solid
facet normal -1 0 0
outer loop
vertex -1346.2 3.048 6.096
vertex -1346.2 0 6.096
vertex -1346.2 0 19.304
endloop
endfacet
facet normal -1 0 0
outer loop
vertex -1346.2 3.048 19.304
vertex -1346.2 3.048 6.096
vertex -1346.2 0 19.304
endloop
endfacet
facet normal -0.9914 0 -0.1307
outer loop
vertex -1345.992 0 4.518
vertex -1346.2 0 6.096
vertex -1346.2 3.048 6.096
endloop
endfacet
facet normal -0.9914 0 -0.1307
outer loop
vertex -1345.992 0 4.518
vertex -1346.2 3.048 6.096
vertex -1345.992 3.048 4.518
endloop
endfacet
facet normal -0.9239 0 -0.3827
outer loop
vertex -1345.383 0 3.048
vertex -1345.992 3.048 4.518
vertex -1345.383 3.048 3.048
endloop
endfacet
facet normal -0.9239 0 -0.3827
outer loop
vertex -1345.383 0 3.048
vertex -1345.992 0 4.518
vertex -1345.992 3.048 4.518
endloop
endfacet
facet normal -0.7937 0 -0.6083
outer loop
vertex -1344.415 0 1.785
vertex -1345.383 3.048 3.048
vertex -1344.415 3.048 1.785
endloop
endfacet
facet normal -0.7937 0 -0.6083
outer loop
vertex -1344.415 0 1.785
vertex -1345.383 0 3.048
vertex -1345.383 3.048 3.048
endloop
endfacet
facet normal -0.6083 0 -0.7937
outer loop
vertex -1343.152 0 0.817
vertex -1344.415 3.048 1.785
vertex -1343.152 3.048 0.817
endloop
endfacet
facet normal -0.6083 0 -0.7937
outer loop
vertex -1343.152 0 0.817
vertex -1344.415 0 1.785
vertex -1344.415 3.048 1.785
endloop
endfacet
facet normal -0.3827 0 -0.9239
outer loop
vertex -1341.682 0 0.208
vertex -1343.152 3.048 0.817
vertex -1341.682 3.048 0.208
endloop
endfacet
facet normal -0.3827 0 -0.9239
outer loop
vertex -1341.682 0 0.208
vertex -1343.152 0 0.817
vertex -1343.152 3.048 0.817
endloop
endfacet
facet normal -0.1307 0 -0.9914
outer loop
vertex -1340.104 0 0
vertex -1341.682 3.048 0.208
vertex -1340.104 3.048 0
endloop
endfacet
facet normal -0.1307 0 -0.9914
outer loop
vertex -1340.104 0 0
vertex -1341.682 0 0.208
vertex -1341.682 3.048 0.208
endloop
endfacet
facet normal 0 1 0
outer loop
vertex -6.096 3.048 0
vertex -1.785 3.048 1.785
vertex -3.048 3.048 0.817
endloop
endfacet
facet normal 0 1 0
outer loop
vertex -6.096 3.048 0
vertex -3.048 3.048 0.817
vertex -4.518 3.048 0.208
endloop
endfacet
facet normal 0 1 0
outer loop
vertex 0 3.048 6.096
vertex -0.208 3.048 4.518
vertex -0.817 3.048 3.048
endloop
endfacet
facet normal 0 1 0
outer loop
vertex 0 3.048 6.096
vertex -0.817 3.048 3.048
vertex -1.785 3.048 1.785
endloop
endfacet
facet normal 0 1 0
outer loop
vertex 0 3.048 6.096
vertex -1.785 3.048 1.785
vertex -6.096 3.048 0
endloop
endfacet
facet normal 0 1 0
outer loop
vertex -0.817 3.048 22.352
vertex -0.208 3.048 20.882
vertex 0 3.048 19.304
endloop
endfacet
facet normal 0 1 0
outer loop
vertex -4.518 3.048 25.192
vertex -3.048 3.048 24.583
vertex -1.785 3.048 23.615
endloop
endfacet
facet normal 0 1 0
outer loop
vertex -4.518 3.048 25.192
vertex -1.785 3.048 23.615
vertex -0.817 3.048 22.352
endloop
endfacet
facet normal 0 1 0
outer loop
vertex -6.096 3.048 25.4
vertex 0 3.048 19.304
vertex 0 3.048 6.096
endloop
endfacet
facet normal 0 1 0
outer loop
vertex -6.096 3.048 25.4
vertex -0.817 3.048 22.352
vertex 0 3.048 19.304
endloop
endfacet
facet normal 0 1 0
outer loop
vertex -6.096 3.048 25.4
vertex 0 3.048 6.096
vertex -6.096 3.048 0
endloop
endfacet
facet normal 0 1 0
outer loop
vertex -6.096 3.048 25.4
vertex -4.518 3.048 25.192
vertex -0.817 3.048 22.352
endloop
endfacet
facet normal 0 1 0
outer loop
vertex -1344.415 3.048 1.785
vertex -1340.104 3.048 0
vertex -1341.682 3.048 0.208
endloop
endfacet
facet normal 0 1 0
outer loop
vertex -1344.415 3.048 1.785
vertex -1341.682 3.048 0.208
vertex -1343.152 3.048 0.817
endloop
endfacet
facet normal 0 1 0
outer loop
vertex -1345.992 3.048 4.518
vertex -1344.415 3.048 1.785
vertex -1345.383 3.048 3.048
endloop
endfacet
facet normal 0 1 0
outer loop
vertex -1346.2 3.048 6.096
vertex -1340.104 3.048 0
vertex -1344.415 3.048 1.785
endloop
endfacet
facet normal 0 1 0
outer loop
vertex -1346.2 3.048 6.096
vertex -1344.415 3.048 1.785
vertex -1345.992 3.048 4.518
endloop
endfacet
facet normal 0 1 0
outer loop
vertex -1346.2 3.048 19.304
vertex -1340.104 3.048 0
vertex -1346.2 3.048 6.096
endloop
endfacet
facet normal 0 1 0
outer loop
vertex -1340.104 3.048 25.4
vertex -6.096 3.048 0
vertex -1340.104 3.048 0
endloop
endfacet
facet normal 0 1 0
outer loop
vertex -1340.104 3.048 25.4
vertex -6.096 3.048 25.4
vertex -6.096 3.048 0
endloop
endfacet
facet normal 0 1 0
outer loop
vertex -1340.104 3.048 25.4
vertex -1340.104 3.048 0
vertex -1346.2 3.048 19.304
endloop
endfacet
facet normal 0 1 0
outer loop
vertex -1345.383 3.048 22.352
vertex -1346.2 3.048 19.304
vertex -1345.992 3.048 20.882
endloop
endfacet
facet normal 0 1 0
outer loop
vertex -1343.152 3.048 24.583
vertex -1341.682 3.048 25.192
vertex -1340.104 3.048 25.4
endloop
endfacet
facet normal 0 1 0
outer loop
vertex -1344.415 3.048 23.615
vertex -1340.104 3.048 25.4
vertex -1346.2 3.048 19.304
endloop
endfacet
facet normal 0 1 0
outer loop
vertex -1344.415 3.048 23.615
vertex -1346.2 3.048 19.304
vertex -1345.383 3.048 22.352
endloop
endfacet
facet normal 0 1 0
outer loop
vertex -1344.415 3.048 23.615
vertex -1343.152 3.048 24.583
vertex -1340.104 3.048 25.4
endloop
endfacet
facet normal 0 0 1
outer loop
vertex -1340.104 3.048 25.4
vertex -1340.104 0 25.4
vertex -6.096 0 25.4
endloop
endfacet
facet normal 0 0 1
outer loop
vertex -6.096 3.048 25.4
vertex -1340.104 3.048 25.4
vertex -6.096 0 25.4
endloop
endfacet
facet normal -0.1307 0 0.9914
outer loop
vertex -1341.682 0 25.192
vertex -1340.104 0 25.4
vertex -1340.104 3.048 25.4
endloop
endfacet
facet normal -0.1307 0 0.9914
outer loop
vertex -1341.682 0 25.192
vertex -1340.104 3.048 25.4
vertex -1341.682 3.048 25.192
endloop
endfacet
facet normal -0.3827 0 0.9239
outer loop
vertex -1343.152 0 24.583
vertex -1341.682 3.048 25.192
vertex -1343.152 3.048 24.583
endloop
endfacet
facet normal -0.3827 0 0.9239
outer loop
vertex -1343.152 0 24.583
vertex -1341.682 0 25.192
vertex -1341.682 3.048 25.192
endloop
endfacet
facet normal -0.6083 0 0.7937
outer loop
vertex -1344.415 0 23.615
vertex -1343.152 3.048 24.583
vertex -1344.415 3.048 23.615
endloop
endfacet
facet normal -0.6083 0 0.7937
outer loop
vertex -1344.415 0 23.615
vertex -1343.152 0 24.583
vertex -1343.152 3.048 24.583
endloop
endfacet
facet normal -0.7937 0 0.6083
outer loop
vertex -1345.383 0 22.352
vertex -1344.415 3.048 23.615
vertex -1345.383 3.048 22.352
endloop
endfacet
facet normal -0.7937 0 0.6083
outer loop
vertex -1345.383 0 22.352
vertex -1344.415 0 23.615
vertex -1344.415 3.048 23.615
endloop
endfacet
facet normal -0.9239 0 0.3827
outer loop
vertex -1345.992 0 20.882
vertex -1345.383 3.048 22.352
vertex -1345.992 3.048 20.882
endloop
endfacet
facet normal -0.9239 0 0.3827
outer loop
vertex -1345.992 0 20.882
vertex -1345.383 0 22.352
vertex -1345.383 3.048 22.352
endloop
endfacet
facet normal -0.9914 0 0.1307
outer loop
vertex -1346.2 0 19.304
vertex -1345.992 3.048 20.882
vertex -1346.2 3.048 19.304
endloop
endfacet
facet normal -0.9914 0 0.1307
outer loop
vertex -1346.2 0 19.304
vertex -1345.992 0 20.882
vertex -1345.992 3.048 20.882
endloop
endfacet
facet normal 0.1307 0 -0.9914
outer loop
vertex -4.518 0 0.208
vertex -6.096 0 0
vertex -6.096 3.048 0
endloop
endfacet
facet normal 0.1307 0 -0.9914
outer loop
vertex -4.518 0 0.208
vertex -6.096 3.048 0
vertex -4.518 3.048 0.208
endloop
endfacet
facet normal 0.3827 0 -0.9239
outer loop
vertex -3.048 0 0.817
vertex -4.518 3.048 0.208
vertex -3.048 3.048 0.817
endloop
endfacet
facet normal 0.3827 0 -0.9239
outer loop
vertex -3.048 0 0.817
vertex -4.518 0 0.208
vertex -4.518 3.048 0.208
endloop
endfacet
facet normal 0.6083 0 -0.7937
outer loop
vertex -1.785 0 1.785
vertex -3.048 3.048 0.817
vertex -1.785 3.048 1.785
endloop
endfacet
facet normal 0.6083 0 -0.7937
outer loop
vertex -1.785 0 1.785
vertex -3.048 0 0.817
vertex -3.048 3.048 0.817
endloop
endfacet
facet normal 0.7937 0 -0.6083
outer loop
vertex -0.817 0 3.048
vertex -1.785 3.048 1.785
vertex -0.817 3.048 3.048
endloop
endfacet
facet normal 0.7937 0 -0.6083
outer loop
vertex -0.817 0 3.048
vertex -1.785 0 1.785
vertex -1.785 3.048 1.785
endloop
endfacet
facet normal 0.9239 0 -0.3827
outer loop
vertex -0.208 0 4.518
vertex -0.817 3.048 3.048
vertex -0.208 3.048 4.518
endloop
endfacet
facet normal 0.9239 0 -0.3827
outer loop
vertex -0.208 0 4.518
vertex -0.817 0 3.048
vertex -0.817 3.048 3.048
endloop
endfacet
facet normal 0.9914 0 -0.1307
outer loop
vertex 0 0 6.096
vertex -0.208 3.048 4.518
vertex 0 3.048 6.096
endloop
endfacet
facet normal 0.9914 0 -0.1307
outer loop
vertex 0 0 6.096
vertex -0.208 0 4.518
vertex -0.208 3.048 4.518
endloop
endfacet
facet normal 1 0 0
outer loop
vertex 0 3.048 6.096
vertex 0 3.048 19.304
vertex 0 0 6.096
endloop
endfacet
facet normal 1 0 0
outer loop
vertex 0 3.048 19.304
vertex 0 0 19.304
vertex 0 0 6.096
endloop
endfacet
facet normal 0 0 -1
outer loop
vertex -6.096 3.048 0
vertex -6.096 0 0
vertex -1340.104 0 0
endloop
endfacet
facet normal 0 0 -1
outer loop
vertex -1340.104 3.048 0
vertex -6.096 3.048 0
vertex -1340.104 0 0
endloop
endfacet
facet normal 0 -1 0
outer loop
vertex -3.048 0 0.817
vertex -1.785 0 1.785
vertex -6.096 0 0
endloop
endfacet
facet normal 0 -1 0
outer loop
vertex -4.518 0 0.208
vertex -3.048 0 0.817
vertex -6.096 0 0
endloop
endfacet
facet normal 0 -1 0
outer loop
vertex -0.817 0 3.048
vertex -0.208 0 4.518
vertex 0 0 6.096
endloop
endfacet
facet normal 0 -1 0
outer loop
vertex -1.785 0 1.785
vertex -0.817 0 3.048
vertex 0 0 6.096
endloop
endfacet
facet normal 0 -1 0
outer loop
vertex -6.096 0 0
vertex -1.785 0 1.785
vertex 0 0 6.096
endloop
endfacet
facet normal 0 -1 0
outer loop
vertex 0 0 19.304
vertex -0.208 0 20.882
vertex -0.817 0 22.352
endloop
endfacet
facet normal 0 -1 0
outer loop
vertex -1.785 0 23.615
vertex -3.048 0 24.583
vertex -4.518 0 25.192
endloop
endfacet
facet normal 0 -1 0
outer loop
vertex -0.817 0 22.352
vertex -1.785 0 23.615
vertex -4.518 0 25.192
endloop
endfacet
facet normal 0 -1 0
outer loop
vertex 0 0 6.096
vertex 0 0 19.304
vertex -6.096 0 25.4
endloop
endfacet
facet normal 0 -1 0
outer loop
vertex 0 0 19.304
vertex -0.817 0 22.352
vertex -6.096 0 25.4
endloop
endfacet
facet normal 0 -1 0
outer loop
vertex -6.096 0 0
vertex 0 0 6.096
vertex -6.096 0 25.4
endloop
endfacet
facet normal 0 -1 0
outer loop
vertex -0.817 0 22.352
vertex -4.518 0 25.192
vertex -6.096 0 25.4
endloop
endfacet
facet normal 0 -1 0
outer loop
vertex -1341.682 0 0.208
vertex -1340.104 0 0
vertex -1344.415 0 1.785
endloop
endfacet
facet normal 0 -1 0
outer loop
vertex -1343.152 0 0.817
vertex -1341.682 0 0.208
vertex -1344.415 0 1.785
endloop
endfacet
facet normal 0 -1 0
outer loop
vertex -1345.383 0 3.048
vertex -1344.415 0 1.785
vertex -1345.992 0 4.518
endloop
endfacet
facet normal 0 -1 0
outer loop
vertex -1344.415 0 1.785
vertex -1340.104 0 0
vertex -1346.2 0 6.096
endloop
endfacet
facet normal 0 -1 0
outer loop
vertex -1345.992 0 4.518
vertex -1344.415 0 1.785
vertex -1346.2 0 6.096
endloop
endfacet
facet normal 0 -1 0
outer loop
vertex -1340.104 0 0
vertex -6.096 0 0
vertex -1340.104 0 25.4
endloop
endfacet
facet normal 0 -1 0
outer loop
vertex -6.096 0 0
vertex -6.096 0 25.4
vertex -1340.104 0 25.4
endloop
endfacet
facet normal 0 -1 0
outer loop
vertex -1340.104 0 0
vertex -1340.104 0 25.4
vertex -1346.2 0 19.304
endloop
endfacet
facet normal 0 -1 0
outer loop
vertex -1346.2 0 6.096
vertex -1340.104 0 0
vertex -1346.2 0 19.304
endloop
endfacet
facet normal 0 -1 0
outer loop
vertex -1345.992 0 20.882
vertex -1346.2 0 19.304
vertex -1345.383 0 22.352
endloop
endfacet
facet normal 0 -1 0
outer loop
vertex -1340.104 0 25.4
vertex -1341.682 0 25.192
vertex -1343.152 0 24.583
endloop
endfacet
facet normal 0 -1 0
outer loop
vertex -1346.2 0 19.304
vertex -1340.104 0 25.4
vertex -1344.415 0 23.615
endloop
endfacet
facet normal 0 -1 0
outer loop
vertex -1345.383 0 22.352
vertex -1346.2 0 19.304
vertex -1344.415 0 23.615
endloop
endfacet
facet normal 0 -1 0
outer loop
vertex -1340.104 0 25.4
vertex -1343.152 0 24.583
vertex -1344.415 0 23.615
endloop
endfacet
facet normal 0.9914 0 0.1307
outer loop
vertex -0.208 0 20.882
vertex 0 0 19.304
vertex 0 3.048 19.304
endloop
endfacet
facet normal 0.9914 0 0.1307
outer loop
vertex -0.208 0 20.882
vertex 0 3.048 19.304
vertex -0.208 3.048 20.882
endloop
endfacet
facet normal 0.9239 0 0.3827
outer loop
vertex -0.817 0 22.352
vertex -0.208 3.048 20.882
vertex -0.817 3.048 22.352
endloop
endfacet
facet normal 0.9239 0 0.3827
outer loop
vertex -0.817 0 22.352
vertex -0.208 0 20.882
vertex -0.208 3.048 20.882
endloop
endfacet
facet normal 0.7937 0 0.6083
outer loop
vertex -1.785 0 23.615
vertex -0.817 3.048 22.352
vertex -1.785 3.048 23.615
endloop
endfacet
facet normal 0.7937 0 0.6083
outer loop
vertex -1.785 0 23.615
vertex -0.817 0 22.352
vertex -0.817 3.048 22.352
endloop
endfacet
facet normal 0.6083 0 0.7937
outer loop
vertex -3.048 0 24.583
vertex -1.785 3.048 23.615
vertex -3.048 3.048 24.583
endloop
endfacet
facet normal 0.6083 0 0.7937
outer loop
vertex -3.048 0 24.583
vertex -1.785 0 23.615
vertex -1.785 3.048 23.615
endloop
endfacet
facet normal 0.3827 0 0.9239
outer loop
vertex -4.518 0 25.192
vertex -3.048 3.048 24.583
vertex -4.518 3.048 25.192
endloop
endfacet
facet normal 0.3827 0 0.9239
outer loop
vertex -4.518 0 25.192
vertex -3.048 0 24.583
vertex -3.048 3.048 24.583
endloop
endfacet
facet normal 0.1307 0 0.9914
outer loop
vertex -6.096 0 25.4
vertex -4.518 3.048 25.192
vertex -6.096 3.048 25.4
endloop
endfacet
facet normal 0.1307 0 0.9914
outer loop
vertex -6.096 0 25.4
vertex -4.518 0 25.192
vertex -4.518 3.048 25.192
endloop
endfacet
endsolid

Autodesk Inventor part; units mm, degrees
ref_plane "YZ Plane" through (0, 0, 0) normal (1, 0, 0) x (0, 1, 0)
ref_plane "XZ Plane" through (0, 0, 0) normal (0, 1, 0) x (-1, 0, 0)
ref_plane "XY Plane" through (0, 0, 0) normal (0, 0, 1) x (1, 0, 0)
sketch "Sketch1" plane through (0, 0, 0) normal (0, 1, 0) x (-1, 0, 0)
  line L0 (6.096, 0) -> (1340.104, 0)
  line L1 (1346.2, 6.096) -> (1346.2, 19.304)
  line L2 (1340.104, 25.4) -> (6.096, 25.4)
  line L3 (0, 19.304) -> (0, 6.096)
  arc A0 (6.096, 25.4) -> (0, 19.304) centre (6.096, 19.304) ccw
  arc A1 (0, 6.096) -> (6.096, 0) centre (6.096, 6.096) ccw
  arc A2 (1340.104, 0) -> (1346.2, 6.096) centre (1340.104, 6.096) ccw
  arc A3 (1346.2, 19.304) -> (1340.104, 25.4) centre (1340.104, 19.304) ccw
  point P0 (0, 0)
  point P1 (1346.2, 25.4)
  point P2 (1346.2, 0)
  point P3 (0, 25.4)
  dimension "d0" = 1346.2
  dimension "d1" = 25.4
  dimension "d2" = 6.096
extrude "Plate1" add sketch "Sketch1" along normal blind 3.048
equation "\"BendRadius\" = Thickness"
equation "\"BendReliefWidth\" = Thickness"
equation "\"BendReliefDepth\" = 0.5 * Thickness"
equation "\"CornerReliefSize\" = 4 * Thickness"
equation "\"MinimumRemnant\" = 2 * Thickness"
equation "\"TransitionRadius\" = BendRadius"
equation "\"JacobiRadiusSize\" = BendRadius"
equation "\"GapSize\" = Thickness"
equation "\"d3\" = BendRadius"
equation "\"Thickness\" = 3.048"
properties part number "bottom" material "Polycarbonate, Clear"
